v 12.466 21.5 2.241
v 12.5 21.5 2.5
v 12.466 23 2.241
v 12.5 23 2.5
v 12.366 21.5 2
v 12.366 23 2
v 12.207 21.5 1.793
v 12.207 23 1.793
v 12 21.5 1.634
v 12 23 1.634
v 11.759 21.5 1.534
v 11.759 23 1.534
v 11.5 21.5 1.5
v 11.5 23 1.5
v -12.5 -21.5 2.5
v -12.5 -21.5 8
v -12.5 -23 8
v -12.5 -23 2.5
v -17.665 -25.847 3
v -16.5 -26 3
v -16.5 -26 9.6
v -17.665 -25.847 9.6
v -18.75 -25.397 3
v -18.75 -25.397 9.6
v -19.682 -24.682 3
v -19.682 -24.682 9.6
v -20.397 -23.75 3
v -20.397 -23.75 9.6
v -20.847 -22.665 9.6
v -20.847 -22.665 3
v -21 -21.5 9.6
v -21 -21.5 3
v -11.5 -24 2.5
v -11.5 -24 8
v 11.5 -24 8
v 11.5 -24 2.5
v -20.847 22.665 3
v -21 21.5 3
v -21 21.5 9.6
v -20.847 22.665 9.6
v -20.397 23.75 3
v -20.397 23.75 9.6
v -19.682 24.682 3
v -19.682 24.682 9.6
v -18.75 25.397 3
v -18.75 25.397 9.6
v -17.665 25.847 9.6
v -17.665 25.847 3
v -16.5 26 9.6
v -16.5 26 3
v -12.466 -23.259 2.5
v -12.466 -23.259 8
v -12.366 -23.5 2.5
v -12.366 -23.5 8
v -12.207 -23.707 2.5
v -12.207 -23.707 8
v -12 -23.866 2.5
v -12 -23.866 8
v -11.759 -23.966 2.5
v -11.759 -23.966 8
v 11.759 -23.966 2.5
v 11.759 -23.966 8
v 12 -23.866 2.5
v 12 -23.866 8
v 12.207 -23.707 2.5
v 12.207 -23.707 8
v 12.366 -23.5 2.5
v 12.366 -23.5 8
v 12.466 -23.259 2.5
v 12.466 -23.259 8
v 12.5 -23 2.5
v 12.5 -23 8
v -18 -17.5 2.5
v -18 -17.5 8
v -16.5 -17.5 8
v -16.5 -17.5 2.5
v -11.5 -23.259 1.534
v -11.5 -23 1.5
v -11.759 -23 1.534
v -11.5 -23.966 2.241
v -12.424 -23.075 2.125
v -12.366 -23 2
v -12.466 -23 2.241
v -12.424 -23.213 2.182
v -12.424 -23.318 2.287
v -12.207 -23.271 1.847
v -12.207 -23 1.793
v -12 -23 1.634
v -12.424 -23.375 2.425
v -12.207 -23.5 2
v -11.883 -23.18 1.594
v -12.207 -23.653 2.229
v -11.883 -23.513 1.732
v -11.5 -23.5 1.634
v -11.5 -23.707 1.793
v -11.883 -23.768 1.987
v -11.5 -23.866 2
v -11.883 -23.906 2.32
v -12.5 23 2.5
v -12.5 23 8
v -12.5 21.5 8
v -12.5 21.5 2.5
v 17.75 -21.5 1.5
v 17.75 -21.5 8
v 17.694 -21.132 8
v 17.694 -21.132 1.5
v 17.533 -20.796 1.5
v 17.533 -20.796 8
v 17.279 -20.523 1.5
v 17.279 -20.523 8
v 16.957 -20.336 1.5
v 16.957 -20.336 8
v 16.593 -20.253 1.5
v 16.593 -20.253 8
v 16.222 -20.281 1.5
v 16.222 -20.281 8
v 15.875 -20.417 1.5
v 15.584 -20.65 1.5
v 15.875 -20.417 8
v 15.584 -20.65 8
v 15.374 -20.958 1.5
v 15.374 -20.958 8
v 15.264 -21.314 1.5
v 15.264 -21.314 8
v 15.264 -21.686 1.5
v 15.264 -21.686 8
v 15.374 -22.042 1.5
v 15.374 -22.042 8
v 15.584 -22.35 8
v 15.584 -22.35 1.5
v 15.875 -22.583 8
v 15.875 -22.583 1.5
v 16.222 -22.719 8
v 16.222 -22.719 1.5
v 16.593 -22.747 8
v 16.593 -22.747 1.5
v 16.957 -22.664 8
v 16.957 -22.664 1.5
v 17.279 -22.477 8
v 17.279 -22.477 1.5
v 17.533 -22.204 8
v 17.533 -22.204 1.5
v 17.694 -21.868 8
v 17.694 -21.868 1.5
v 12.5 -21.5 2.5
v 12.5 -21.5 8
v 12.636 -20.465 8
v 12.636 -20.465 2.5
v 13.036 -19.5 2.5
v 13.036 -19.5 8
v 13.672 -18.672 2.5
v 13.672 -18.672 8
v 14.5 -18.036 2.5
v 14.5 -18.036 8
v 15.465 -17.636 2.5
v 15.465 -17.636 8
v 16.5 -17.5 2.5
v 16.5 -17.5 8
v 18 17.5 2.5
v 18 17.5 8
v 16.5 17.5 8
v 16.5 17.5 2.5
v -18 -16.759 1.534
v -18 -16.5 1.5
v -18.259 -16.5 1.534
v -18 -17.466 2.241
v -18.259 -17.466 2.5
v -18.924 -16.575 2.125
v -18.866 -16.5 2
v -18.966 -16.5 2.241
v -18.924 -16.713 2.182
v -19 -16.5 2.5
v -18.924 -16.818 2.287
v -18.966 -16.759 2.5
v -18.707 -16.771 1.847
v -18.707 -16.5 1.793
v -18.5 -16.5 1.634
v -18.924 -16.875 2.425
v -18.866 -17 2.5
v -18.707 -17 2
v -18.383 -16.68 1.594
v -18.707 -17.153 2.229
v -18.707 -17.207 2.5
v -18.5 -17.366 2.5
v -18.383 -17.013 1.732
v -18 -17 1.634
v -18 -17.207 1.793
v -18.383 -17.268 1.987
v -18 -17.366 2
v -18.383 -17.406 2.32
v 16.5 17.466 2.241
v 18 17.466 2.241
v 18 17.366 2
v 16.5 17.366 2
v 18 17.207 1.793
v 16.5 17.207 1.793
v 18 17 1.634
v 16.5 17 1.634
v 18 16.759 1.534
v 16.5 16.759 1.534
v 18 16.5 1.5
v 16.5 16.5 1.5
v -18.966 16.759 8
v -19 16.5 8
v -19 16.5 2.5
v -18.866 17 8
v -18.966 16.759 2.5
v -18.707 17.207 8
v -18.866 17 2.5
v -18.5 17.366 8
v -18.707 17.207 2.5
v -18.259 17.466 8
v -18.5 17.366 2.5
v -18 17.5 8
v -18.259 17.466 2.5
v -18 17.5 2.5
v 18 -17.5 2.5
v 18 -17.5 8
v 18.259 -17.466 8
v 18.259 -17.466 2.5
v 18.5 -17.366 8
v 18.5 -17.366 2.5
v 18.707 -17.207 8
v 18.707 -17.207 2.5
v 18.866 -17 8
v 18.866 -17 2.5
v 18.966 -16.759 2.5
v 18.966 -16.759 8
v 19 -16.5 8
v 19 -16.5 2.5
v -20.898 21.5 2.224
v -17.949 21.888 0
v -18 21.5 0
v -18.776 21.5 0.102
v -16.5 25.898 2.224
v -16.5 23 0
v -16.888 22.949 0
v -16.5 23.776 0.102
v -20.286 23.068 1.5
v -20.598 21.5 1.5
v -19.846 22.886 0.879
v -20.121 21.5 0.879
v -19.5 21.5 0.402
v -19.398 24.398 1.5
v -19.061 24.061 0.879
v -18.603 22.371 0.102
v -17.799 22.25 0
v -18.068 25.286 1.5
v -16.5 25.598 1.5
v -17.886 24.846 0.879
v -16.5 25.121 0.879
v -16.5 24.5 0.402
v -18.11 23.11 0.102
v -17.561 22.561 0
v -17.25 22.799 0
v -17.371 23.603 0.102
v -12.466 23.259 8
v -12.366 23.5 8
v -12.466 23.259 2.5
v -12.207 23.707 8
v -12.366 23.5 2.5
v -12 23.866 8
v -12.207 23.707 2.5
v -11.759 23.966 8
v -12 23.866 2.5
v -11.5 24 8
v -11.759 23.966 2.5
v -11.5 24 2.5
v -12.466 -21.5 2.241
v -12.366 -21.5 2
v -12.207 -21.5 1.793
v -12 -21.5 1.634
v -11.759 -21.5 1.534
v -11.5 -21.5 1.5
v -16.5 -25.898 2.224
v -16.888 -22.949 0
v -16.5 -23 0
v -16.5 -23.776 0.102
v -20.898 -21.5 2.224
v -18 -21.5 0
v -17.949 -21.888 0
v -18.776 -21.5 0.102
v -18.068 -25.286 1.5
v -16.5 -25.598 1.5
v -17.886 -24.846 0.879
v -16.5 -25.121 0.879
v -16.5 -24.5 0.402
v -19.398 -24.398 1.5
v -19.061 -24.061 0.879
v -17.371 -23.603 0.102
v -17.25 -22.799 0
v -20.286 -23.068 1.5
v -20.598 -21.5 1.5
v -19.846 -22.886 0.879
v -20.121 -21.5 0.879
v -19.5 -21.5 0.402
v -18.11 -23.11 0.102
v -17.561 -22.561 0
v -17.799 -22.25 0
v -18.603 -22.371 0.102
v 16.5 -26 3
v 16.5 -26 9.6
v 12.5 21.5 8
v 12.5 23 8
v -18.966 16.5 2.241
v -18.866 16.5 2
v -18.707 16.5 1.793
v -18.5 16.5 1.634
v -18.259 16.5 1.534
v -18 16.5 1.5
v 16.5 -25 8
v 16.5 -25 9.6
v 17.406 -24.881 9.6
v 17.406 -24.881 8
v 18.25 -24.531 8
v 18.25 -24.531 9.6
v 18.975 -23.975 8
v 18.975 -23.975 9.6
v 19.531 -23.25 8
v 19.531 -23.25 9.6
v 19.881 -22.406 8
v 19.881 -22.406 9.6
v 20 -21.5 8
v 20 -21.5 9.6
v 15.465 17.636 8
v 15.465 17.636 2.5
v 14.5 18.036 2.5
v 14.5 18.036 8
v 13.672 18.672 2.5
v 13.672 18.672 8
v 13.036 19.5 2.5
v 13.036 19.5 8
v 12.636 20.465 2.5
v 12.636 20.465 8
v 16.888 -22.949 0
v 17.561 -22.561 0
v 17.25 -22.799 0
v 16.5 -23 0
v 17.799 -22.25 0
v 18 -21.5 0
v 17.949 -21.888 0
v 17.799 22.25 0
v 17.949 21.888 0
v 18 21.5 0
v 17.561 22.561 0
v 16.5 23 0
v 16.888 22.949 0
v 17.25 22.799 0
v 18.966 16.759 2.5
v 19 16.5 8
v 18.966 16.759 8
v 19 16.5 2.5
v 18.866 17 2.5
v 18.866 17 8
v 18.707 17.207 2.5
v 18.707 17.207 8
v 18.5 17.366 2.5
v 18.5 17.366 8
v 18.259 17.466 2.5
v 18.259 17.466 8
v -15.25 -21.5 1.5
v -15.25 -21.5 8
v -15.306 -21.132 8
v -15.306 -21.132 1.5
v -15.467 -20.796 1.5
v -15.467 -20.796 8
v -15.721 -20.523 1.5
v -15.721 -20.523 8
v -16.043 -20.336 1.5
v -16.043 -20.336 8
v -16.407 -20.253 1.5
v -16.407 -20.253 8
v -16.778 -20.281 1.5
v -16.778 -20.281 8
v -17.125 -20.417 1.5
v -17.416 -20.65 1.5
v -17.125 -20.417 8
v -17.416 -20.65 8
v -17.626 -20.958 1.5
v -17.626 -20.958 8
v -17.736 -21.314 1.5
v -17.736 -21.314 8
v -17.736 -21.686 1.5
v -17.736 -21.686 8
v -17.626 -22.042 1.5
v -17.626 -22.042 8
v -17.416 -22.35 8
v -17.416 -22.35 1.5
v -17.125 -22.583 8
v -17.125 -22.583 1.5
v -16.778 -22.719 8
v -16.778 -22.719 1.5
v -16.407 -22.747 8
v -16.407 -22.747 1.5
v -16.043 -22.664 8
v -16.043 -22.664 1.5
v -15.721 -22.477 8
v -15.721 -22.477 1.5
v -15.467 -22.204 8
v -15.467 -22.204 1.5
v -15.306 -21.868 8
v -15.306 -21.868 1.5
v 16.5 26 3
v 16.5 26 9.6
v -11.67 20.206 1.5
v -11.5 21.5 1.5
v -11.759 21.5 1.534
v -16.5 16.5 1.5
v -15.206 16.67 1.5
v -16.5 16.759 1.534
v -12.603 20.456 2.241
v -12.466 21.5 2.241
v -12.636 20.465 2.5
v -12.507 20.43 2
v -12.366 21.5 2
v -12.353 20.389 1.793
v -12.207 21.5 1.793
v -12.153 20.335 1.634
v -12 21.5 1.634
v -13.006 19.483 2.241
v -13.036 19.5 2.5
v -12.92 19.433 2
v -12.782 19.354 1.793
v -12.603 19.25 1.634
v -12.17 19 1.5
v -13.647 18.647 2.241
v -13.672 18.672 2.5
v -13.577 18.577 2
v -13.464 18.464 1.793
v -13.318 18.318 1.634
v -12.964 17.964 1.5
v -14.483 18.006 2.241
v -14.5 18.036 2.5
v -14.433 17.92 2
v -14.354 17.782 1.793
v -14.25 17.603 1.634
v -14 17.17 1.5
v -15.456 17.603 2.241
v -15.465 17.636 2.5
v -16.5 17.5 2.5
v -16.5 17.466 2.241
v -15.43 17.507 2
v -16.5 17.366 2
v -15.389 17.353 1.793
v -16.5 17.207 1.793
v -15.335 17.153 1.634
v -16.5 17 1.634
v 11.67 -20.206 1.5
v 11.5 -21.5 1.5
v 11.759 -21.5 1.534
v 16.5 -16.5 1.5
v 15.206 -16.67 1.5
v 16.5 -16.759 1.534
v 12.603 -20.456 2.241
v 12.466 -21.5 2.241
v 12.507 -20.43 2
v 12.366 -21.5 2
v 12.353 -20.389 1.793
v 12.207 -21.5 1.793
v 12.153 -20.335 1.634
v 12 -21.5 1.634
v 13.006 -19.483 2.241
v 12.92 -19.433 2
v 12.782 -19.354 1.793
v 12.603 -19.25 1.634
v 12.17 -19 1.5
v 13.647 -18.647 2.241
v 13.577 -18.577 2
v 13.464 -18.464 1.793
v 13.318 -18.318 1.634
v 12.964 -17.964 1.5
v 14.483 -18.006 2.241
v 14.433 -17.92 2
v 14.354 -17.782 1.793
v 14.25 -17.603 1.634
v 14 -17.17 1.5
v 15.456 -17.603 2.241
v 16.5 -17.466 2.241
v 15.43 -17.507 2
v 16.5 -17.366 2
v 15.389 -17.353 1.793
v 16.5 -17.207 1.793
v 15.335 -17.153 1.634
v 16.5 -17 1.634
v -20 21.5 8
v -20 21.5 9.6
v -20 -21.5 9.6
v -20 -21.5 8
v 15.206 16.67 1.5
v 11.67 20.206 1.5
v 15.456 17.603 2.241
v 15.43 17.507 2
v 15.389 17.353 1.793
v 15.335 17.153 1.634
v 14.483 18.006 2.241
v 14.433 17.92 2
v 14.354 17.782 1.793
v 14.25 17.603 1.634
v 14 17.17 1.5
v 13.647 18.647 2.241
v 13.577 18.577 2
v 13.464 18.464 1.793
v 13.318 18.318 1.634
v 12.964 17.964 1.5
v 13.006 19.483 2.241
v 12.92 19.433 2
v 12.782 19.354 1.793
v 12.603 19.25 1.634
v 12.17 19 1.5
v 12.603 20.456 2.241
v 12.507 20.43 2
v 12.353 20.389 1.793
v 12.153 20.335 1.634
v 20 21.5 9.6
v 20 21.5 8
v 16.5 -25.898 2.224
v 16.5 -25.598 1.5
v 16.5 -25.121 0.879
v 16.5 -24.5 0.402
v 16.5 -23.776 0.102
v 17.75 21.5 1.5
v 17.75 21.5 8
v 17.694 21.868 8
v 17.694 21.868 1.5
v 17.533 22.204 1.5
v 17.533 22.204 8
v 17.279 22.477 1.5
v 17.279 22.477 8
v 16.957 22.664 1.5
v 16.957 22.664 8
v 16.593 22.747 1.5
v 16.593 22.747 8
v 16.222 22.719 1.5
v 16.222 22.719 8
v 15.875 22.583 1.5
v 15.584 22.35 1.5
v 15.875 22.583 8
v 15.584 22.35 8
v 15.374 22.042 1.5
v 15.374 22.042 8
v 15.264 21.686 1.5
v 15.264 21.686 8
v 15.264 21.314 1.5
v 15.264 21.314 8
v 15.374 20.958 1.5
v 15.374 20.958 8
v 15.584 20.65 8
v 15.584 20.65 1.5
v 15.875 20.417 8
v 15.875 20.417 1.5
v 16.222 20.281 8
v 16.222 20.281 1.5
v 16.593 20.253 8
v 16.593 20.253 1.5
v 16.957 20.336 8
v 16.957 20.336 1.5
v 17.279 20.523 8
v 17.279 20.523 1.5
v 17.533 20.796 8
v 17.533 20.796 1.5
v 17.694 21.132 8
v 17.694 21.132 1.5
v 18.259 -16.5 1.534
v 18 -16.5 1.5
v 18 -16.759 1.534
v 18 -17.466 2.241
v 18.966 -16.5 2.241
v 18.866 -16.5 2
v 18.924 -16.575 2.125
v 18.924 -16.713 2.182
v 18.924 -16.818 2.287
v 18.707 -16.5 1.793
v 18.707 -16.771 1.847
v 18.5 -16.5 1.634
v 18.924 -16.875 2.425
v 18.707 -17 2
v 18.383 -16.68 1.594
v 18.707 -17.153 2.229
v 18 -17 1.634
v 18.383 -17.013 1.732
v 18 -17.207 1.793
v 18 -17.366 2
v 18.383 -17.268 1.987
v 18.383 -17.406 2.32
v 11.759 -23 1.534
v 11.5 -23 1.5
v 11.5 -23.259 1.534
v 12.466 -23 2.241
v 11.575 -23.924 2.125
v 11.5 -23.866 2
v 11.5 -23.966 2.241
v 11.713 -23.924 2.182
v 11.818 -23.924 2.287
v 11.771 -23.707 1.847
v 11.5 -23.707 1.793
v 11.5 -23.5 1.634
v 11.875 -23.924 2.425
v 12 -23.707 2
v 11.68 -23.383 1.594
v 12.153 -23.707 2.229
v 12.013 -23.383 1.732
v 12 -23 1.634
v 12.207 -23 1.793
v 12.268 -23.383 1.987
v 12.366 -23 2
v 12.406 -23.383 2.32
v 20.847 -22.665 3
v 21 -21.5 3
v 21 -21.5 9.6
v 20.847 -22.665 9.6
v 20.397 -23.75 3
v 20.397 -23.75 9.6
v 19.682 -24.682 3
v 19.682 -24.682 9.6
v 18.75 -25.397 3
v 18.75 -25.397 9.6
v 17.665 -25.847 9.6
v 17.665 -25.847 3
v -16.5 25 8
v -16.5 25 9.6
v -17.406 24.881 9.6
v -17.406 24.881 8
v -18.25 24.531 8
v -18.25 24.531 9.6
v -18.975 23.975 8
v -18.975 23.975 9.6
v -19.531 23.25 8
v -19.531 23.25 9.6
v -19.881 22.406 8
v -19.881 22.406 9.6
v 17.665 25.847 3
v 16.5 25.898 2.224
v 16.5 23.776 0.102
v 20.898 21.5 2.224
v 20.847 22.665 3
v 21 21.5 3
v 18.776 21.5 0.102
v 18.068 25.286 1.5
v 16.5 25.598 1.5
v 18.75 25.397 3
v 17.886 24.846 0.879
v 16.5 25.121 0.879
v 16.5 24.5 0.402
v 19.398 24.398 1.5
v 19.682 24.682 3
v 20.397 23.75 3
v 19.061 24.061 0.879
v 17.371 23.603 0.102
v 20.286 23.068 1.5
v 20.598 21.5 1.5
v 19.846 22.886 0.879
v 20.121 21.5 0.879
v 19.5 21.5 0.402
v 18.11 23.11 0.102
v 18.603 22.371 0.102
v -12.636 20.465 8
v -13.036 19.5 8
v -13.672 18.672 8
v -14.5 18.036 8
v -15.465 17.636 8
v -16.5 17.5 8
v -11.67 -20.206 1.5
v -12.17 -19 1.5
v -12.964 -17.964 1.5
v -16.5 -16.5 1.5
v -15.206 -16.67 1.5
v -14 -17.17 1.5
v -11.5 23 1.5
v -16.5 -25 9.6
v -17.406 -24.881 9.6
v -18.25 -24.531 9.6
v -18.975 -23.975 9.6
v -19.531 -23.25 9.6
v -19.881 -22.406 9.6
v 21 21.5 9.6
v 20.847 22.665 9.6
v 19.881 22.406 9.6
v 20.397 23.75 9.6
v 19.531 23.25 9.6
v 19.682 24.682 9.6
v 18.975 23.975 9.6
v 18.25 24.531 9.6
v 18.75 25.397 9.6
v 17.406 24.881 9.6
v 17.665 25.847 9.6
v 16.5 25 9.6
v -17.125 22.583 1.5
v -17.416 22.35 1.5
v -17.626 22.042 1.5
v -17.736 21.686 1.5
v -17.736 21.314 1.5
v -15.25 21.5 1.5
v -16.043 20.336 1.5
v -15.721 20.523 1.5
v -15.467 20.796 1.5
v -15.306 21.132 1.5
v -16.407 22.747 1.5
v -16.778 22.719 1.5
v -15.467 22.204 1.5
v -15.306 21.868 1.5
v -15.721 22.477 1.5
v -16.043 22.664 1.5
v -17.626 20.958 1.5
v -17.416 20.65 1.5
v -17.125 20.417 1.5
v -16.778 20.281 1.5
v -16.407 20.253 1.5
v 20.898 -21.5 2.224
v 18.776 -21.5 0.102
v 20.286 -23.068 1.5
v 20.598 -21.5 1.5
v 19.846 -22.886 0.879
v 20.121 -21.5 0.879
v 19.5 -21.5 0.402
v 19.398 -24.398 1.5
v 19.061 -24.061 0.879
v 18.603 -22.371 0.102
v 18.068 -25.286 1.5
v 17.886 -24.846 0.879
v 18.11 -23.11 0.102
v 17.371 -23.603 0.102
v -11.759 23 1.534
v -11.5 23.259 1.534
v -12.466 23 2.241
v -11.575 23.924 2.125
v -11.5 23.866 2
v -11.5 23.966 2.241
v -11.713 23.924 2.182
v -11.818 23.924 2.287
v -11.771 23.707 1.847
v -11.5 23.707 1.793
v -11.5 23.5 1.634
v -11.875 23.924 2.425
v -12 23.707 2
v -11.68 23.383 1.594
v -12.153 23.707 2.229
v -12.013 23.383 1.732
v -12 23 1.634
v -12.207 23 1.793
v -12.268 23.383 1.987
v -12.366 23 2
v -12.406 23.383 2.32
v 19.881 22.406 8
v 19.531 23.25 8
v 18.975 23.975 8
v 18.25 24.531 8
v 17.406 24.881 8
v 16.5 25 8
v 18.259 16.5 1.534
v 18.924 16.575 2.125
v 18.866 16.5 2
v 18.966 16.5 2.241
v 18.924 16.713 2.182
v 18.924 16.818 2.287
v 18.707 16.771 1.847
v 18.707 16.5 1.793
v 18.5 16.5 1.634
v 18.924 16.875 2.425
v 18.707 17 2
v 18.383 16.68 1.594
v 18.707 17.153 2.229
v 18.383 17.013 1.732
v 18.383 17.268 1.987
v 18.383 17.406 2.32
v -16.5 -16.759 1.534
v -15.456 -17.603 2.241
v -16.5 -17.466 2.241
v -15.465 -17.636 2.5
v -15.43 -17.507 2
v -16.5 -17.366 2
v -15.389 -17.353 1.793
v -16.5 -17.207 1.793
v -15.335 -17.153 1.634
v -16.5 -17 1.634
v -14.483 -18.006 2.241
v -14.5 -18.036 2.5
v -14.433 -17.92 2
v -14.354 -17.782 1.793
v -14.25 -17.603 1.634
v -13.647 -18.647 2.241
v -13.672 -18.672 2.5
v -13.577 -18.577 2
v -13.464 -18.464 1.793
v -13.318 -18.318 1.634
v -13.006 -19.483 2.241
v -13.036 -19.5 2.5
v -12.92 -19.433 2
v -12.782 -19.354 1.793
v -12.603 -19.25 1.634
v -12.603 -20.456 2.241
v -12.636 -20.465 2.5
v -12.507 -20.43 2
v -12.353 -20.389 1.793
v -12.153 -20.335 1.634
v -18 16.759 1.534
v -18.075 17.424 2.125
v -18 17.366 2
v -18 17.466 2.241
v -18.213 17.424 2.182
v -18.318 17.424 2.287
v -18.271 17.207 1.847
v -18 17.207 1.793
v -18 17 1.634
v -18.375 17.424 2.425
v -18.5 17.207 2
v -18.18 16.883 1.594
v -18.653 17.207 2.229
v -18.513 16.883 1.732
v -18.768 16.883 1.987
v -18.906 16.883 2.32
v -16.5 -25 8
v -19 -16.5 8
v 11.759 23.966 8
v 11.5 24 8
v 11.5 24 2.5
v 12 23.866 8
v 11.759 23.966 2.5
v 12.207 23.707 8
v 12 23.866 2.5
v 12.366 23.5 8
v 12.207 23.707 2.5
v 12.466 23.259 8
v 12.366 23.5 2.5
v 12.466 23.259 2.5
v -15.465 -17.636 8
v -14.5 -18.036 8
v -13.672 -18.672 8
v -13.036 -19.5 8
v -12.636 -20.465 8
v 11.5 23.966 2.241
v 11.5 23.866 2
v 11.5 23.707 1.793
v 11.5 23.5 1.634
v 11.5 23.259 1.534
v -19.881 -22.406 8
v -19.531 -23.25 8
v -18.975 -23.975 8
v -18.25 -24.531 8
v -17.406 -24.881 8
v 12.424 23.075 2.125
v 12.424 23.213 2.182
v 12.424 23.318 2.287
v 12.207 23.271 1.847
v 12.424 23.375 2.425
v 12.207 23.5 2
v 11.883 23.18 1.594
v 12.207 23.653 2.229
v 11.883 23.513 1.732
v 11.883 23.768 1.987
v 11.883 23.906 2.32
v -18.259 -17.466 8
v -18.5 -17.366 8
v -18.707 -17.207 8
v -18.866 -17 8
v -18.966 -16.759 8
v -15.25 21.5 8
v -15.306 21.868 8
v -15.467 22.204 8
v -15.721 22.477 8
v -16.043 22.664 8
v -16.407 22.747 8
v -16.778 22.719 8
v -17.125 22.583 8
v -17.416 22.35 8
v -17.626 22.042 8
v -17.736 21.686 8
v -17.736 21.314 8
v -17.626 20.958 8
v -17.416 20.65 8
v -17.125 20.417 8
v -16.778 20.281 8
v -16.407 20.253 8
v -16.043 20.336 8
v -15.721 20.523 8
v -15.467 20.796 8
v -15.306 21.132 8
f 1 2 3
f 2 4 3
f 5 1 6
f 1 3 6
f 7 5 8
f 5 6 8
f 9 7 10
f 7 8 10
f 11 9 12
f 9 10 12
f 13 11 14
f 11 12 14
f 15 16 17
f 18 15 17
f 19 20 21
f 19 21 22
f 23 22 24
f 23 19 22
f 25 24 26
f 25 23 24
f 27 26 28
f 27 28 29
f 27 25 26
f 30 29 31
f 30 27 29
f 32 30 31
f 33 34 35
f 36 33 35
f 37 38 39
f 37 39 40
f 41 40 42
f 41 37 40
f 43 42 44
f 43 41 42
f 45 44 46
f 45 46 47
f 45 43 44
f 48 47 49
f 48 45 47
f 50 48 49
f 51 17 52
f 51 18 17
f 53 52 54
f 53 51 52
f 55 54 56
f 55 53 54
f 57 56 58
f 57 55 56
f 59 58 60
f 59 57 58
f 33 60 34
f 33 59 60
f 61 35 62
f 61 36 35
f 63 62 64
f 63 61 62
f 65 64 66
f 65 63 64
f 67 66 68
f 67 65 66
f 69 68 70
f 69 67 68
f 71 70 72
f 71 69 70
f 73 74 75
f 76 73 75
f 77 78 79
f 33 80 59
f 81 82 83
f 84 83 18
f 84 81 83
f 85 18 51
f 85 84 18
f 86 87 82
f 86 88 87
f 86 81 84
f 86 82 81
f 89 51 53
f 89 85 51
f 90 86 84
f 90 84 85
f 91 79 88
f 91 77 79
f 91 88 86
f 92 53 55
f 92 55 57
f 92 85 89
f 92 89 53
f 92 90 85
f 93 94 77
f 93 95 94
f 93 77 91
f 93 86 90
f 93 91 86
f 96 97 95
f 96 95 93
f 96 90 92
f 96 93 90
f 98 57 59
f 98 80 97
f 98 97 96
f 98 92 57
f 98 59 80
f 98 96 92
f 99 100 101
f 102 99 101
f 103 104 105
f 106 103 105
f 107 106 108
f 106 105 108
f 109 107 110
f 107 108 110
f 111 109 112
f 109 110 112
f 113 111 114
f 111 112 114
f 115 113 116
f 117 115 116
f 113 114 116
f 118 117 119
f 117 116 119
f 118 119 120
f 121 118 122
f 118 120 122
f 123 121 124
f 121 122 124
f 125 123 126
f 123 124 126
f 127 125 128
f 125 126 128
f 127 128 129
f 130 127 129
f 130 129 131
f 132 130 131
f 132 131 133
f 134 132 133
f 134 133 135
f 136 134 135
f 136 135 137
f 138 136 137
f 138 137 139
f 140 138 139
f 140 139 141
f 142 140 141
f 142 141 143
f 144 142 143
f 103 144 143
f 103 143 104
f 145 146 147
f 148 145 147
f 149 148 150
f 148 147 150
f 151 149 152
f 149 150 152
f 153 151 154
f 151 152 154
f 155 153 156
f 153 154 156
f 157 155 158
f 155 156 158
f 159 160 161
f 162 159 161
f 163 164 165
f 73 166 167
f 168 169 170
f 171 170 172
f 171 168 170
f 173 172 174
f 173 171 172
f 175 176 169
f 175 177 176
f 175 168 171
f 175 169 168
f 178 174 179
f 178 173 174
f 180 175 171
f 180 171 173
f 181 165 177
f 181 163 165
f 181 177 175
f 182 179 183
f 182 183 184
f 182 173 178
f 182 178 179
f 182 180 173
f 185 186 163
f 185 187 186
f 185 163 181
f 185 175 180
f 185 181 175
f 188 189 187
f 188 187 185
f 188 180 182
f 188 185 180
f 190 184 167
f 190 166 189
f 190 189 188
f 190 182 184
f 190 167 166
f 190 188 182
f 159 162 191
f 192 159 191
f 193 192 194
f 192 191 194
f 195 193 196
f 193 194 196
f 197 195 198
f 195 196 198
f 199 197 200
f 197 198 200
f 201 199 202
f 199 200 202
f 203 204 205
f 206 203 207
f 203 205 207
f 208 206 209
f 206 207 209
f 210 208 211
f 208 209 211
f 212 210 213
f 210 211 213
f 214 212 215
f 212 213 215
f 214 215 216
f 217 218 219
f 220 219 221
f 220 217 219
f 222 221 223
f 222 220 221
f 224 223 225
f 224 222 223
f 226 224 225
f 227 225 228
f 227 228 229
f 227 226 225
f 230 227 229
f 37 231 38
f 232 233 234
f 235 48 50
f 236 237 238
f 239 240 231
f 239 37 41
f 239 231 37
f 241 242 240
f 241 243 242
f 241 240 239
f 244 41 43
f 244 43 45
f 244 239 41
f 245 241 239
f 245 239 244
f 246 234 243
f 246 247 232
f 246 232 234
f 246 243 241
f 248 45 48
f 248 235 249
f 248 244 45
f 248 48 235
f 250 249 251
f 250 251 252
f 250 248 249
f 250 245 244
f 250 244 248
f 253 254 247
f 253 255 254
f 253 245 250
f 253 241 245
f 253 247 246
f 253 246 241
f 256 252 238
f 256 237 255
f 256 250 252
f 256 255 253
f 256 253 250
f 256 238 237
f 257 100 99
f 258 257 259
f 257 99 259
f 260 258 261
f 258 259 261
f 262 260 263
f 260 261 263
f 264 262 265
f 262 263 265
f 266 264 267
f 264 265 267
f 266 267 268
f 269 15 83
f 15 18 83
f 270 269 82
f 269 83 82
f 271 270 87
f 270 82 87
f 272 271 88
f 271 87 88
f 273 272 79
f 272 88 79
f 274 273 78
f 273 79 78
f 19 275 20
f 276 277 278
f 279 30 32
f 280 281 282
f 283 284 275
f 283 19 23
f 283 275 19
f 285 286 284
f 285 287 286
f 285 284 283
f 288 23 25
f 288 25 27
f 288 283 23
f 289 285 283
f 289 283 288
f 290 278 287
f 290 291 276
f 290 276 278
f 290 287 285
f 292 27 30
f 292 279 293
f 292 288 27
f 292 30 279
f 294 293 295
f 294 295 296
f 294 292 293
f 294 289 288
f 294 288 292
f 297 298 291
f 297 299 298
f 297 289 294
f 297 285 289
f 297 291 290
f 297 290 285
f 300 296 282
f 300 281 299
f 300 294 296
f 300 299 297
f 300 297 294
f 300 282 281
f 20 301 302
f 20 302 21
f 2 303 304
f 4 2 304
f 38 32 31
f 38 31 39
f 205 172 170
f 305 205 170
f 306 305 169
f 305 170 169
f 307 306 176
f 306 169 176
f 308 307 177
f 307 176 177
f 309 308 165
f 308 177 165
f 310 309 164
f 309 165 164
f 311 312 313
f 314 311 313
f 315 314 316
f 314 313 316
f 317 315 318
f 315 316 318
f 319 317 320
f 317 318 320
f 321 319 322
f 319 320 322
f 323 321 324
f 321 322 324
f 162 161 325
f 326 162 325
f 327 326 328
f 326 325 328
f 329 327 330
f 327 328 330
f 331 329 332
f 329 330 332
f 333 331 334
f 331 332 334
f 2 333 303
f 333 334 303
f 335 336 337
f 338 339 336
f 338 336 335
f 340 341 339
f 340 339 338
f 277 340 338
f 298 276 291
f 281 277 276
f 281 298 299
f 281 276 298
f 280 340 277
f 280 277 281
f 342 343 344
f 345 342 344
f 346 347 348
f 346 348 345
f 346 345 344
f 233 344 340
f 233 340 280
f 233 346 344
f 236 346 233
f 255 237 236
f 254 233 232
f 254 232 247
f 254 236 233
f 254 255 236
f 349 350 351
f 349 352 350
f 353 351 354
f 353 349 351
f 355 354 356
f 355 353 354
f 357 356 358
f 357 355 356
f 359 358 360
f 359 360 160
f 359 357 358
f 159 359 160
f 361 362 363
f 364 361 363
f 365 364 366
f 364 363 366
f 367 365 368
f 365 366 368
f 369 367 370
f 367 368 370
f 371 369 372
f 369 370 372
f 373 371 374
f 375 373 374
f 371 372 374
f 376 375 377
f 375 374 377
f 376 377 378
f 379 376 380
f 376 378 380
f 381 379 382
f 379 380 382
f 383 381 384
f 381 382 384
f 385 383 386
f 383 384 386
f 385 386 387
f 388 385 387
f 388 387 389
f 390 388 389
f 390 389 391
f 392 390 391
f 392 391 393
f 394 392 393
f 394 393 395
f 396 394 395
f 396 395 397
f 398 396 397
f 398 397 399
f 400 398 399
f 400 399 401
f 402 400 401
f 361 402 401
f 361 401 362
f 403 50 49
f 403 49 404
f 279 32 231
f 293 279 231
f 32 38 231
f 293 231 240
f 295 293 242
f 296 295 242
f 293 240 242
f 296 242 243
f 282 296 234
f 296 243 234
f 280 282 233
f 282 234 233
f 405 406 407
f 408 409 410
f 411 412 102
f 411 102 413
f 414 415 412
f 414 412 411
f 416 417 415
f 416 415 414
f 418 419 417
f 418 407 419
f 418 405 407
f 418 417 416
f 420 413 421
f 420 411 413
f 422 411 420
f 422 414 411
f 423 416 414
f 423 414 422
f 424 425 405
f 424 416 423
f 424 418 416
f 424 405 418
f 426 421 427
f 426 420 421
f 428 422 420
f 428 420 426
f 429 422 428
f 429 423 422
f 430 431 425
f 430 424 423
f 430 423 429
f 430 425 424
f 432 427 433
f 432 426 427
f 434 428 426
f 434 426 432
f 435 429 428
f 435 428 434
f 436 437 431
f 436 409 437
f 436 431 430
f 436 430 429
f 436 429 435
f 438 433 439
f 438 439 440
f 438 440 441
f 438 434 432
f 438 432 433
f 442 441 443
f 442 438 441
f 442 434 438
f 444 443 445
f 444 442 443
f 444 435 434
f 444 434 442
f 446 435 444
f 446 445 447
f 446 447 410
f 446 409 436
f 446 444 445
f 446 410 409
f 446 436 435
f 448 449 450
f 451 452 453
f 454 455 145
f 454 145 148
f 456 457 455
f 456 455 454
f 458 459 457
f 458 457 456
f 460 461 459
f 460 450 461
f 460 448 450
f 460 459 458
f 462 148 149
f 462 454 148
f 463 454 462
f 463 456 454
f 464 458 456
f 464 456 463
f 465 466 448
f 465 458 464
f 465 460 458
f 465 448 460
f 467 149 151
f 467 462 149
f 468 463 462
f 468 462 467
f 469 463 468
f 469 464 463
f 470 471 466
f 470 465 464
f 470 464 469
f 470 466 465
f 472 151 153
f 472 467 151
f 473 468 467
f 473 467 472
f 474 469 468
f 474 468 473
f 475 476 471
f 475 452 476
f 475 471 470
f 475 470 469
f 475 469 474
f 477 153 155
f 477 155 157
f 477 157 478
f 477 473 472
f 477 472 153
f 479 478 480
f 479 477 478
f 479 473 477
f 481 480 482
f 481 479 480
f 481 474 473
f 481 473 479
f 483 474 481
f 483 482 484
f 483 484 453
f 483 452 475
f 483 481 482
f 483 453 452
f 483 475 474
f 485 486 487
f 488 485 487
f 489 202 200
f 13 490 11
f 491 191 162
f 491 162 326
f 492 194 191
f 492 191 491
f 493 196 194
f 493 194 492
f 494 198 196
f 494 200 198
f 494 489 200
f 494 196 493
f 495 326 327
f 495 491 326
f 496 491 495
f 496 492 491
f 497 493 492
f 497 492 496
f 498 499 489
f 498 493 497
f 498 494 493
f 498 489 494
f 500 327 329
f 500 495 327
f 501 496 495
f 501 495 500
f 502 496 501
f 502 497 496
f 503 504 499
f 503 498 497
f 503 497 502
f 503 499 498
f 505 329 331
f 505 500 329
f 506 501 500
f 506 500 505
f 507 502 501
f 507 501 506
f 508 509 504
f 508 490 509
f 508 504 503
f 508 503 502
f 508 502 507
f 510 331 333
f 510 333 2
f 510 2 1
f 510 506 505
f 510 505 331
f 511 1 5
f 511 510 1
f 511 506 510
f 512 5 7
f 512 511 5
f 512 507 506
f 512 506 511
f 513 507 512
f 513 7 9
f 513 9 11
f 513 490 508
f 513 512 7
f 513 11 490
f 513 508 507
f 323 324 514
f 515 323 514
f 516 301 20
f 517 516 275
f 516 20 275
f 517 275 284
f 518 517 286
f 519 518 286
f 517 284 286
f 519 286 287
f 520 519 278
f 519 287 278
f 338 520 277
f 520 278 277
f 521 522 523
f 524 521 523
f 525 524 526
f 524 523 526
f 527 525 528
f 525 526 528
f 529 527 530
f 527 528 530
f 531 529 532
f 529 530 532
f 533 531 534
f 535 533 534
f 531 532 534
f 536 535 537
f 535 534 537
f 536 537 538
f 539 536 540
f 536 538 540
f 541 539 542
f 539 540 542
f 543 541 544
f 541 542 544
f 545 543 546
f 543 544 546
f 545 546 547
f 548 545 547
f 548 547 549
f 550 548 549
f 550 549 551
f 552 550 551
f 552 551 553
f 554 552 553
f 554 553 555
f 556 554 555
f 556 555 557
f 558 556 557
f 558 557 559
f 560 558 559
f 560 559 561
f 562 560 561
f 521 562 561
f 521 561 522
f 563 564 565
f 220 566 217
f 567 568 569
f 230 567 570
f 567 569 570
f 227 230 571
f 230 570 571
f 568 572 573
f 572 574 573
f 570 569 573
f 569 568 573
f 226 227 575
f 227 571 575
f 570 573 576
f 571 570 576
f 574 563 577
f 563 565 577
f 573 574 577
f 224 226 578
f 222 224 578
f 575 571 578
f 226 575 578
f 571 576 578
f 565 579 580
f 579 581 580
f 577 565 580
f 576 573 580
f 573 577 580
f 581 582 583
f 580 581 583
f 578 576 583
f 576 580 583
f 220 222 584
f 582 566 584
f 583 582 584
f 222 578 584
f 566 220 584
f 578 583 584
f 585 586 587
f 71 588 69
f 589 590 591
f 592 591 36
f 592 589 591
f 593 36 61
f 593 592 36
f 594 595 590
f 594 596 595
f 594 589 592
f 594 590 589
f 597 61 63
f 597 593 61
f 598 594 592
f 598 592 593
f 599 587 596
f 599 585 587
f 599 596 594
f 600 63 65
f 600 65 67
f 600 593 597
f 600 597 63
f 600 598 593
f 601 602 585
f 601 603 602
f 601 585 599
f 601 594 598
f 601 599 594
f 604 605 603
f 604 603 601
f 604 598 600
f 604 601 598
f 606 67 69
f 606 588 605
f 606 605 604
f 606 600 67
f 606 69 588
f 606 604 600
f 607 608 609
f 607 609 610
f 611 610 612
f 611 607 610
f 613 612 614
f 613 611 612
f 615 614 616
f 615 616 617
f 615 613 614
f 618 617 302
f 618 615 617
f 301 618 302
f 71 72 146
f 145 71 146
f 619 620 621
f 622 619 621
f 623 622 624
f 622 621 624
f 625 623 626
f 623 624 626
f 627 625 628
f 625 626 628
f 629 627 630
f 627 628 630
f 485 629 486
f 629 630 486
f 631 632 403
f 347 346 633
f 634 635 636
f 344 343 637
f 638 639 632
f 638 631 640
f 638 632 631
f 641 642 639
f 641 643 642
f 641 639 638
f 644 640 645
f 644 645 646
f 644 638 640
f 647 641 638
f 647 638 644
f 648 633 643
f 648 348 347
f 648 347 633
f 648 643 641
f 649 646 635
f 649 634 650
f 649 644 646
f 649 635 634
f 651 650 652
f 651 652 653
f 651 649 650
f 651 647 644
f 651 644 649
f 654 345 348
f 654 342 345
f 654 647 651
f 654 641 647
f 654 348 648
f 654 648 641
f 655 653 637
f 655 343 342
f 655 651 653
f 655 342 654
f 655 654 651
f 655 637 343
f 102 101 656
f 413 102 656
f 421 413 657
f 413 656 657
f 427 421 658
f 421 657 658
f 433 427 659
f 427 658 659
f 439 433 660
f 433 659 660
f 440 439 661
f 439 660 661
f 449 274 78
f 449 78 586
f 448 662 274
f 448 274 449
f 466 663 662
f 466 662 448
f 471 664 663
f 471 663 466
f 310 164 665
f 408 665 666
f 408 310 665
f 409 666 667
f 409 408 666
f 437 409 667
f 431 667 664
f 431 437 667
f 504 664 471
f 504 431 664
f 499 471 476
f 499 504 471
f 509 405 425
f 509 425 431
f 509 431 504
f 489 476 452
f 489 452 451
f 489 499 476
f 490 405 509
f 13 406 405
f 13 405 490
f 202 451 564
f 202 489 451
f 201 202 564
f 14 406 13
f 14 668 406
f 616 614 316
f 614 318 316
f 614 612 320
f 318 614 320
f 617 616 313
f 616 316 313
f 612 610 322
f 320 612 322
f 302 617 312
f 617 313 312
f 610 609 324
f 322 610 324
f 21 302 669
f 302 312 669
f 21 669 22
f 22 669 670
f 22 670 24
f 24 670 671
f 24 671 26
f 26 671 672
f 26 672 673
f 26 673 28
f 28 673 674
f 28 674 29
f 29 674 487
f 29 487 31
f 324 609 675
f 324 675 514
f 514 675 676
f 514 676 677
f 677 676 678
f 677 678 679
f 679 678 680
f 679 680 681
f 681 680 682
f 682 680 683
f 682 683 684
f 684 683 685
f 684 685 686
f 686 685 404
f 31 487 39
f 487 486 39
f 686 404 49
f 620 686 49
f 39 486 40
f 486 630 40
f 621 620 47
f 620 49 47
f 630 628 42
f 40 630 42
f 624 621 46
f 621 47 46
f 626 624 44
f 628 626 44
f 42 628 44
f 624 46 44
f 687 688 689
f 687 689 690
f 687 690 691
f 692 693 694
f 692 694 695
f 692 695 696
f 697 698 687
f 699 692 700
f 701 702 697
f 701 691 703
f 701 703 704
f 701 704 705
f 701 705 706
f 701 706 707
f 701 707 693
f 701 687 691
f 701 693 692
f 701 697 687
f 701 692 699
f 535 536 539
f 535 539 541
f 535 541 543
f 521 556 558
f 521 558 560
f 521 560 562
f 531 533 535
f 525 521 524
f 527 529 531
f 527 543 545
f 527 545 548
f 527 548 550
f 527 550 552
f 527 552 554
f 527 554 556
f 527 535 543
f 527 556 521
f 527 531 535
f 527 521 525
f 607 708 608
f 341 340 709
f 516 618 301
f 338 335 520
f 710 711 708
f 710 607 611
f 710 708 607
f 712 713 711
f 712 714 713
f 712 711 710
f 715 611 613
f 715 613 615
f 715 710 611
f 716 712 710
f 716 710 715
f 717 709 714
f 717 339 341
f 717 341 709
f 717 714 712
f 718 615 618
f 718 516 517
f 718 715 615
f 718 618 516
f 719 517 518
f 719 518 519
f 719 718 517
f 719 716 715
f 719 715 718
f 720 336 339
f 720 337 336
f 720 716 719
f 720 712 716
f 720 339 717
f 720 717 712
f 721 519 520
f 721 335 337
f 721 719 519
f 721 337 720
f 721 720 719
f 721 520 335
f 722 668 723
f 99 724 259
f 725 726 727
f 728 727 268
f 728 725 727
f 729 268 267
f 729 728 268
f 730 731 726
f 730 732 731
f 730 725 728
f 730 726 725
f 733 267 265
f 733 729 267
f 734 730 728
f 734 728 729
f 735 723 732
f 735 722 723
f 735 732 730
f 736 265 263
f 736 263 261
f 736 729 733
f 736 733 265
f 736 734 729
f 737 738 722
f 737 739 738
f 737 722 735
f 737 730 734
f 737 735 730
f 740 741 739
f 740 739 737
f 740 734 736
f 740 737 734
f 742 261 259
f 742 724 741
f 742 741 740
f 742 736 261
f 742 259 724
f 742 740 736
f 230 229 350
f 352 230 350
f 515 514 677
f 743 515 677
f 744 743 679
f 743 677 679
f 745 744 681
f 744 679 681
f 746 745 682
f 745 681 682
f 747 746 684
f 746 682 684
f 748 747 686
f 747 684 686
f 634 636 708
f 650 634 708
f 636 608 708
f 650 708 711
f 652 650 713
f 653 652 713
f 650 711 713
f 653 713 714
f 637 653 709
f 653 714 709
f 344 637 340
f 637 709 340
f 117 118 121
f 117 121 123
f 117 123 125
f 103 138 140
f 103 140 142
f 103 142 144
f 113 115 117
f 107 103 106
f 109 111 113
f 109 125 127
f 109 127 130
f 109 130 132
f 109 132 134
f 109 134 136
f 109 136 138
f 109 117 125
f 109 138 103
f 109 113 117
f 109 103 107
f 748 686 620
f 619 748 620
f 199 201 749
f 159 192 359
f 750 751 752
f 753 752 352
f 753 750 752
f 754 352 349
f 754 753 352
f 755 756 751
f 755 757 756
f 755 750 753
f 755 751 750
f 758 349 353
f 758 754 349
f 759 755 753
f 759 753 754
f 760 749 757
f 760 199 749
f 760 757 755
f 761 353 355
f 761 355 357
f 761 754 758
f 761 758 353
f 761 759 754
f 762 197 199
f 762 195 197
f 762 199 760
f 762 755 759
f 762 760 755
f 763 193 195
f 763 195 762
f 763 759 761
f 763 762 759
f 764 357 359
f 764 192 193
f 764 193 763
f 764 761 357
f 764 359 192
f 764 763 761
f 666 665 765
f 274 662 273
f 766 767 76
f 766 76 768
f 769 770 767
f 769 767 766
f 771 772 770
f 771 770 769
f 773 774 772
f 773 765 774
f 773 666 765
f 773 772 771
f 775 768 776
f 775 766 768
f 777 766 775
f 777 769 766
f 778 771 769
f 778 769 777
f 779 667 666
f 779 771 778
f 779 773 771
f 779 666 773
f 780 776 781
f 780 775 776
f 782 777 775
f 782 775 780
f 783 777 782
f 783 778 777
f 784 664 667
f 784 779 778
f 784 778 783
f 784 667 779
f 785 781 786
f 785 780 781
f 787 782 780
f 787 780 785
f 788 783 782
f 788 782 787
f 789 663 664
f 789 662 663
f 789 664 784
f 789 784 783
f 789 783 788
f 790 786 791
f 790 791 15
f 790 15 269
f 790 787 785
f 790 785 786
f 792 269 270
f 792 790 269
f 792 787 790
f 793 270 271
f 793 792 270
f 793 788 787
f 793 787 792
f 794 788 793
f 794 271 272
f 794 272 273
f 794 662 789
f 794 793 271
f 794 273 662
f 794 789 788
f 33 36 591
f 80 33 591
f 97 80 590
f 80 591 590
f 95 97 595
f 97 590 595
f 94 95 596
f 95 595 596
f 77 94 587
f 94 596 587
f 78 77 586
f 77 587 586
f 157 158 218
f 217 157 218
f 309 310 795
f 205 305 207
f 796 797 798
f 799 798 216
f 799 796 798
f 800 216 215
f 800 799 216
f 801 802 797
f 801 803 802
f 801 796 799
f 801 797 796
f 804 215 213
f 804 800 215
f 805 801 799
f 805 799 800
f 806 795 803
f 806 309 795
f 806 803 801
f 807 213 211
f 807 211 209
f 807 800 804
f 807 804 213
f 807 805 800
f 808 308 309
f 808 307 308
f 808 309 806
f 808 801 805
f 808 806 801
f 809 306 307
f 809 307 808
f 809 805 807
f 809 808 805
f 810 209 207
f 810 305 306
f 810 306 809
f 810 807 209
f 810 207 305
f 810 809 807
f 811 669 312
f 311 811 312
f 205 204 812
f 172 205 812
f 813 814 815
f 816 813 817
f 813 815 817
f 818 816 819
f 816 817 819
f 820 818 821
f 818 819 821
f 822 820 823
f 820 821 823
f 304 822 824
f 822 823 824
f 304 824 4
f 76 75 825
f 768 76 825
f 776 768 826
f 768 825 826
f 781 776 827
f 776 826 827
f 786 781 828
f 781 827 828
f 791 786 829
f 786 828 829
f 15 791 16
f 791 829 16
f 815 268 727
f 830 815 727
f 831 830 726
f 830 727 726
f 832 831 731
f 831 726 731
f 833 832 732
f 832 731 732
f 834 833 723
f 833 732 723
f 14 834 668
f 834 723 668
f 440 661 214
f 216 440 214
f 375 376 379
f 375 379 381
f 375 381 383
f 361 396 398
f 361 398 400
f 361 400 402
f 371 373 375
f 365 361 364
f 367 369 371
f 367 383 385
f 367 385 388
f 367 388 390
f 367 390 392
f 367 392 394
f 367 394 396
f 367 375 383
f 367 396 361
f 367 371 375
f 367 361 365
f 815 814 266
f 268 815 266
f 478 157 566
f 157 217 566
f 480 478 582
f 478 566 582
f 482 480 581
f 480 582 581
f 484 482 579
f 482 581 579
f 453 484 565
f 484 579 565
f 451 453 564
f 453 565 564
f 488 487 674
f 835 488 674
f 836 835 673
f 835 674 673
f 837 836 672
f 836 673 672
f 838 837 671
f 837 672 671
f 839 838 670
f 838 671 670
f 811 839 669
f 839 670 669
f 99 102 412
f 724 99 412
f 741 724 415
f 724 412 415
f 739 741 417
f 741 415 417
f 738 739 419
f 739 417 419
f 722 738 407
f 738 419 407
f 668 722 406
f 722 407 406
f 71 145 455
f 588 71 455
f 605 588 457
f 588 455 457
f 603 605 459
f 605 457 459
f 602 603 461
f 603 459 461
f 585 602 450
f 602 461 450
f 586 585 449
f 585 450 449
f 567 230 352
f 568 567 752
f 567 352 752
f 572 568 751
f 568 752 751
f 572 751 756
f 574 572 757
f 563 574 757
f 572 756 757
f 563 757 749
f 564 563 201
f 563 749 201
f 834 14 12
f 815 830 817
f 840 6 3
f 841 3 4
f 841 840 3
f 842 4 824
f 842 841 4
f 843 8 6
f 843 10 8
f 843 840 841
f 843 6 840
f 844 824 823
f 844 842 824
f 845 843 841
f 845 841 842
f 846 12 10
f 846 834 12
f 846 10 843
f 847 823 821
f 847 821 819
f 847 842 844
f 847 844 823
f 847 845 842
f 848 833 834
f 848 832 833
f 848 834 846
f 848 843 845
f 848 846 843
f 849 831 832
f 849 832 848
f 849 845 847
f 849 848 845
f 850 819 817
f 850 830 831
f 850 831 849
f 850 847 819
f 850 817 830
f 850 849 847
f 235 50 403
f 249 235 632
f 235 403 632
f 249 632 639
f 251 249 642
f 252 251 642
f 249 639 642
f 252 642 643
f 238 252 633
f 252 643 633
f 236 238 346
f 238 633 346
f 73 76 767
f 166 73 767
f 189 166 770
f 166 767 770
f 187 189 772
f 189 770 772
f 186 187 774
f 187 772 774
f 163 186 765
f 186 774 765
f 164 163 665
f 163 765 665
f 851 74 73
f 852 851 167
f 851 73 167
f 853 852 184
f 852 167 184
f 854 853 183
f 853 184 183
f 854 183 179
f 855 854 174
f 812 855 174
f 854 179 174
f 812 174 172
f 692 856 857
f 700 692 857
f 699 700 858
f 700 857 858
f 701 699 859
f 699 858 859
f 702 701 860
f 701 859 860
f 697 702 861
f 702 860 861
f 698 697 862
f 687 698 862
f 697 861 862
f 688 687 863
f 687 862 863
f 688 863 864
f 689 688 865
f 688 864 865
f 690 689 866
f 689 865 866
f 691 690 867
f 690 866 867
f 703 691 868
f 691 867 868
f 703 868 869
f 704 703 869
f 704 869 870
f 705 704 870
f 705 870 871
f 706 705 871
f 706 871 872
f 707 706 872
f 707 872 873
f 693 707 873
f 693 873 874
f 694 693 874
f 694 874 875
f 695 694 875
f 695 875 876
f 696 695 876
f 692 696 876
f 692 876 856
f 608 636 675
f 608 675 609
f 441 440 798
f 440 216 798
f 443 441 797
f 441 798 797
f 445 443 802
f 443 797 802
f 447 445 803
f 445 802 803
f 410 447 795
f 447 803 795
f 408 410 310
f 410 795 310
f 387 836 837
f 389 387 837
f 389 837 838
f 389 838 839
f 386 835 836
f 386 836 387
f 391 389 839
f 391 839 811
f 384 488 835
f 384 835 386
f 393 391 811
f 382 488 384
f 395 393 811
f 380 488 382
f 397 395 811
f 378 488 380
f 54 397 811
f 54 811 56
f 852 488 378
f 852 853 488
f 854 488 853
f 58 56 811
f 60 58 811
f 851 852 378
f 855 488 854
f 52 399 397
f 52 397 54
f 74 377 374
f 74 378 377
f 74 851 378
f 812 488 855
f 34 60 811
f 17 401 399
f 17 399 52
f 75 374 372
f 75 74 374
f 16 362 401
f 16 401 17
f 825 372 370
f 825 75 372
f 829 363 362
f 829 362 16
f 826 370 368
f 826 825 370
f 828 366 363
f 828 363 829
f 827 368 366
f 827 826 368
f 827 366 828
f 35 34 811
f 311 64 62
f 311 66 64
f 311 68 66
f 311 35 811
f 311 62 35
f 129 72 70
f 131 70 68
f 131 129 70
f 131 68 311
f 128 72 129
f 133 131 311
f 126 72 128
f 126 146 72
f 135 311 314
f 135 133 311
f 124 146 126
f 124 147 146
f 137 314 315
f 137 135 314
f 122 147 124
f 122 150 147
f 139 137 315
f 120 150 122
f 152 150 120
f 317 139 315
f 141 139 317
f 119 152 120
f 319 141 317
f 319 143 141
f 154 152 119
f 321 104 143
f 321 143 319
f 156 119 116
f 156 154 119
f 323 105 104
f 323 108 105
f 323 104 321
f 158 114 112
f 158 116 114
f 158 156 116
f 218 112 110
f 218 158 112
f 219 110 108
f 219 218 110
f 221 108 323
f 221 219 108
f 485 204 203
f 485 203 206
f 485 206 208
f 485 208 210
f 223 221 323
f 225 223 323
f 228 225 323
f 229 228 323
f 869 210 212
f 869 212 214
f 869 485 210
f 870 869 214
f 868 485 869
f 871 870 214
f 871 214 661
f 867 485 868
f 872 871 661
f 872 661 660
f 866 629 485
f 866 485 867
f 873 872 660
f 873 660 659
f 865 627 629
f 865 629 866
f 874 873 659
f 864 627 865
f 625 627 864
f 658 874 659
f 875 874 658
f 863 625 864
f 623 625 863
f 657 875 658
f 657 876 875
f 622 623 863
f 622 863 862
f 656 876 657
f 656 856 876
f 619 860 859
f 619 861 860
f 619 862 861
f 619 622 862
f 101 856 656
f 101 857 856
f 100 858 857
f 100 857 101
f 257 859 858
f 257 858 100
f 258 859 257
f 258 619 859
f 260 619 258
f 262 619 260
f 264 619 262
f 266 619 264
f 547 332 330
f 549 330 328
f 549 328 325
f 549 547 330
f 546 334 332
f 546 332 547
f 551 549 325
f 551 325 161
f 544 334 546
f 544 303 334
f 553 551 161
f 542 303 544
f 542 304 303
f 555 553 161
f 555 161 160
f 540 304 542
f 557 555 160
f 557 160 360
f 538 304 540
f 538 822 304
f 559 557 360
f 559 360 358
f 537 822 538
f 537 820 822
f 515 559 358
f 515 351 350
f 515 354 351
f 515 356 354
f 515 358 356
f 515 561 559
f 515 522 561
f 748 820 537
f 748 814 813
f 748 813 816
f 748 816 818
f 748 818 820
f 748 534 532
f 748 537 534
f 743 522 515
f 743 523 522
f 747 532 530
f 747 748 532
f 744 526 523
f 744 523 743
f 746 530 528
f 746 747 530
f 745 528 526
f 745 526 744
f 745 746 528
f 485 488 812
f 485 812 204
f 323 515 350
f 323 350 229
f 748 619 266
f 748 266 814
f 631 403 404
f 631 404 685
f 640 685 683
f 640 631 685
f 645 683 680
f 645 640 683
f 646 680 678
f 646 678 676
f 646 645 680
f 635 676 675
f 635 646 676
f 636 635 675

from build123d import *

# Parameters (mm, degrees)
BOSS_EXTRUDE1_DEPTH = 9.6
CUT_EXTRUDE1_START  = 9.6
CUT_EXTRUDE1_DEPTH  = 1.6
CUT_EXTRUDE2_START  = 9.6
CUT_EXTRUDE2_DEPTH  = 8.1
CUT_EXTRUDE3_START  = 9.6
SKETCH5_R           = 1.25
CUT_EXTRUDE3_DEPTH  = 8.1
FILLET2_R           = 1
FILLET3_R           = 3


with BuildPart() as part:
    # Sketch2 → Boss-Extrude1 (new body)
    with BuildSketch(Plane.XY):
        with BuildLine():
            Line((21, 21.5), (21, -21.5))
            ThreePointArc((21, -21.5), (19.681980515, -24.681980515), (16.5, -26))
            Line((16.5, -26), (-16.5, -26))
            ThreePointArc((-16.5, -26), (-19.681980515, -24.681980515), (-21, -21.5))
            Line((-21, -21.5), (-21, 21.5))
            ThreePointArc((-21, 21.5), (-19.681980515, 24.681980515), (-16.5, 26))
            Line((-16.5, 26), (16.5, 26))
            ThreePointArc((16.5, 26), (19.681980515, 24.681980515), (21, 21.5))
        make_face()
    extrude(amount=BOSS_EXTRUDE1_DEPTH)

    # Sketch3 → Cut-Extrude1 (cut)
    with BuildSketch(Plane.XY.offset(CUT_EXTRUDE1_START)):
        with BuildLine():
            Line((-20, 21.5), (-20, -21.5))
            ThreePointArc((-20, -21.5), (-18.974873734, -23.974873734), (-16.5, -25))
            Line((-16.5, -25), (16.5, -25))
            ThreePointArc((16.5, -25), (18.974873734, -23.974873734), (20, -21.5))
            Line((20, -21.5), (20, 21.5))
            ThreePointArc((20, 21.5), (18.974873734, 23.974873734), (16.5, 25))
            Line((16.5, 25), (-16.5, 25))
            ThreePointArc((-16.5, 25), (-18.974873734, 23.974873734), (-20, 21.5))
        make_face()
    extrude(amount=-CUT_EXTRUDE1_DEPTH, mode=Mode.SUBTRACT)

    # Sketch4 → Cut-Extrude2 (cut)
    with BuildSketch(Plane.XY.offset(CUT_EXTRUDE2_START)):
        with BuildLine():
            Line((-12.5, -21.5), (-12.5, -24))
            Line((-12.5, -24), (12.5, -24))
            Line((12.5, -24), (12.5, -21.5))
            ThreePointArc((12.5, -21.5), (13.671572875, -18.671572875), (16.5, -17.5))
            Line((16.5, -17.5), (19, -17.5))
            Line((19, -17.5), (19, 17.5))
            Line((19, 17.5), (16.5, 17.5))
            ThreePointArc((16.5, 17.5), (13.671572875, 18.671572875), (12.5, 21.5))
            Line((12.5, 21.5), (12.5, 24))
            Line((12.5, 24), (-12.5, 24))
            Line((-12.5, 24), (-12.5, 21.5))
            ThreePointArc((-12.5, 21.5), (-13.671572875, 18.671572875), (-16.5, 17.5))
            Line((-16.5, 17.5), (-19, 17.5))
            Line((-19, 17.5), (-19, -17.5))
            Line((-19, -17.5), (-16.5, -17.5))
            ThreePointArc((-16.5, -17.5), (-13.671572875, -18.671572875), (-12.5, -21.5))
        make_face()
    extrude(amount=-CUT_EXTRUDE2_DEPTH, mode=Mode.SUBTRACT)

    # Sketch5 → Cut-Extrude3 (cut)
    with BuildSketch(Plane.XY.offset(CUT_EXTRUDE3_START)):
        with Locations((-16.5, 21.5)):
            Circle(SKETCH5_R)
        with Locations((16.5, 21.5)):
            Circle(SKETCH5_R)
        with Locations((-16.5, -21.5)):
            Circle(SKETCH5_R)
        with Locations((16.5, -21.5)):
            Circle(SKETCH5_R)
    extrude(amount=-CUT_EXTRUDE3_DEPTH, mode=Mode.SUBTRACT)

    # Fillet2
    fillet2_edges = [part.edges().sort_by_distance(p)[0] for p in [
        (13.671572875, -18.671572875, 1.5),
        (12.5, -22.75, 1.5),
        (0, -24, 1.5),
        (12.5, -24, 4.75),
        (-12.5, -22.75, 1.5),
        (-12.5, -24, 4.75),
        (-13.671572875, -18.671572875, 1.5),
        (-17.75, -17.5, 1.5),
        (-19, 0, 1.5),
        (-19, -17.5, 4.75),
        (-17.75, 17.5, 1.5),
        (-19, 17.5, 4.75),
        (-13.671572875, 18.671572875, 1.5),
        (-12.5, 22.75, 1.5),
        (0, 24, 1.5),
        (-12.5, 24, 4.75),
        (12.5, 22.75, 1.5),
        (12.5, 24, 4.75),
        (13.671572875, 18.671572875, 1.5),
        (17.75, 17.5, 1.5),
        (19, 0, 1.5),
        (19, 17.5, 4.75),
        (17.75, -17.5, 1.5),
        (19, -17.5, 4.75),
    ]]
    fillet(fillet2_edges, radius=FILLET2_R)

    # Fillet3
    fillet3_edges = [part.edges().sort_by_distance(p)[0] for p in [
        (-21, 0, 0),
        (-19.681980515, 24.681980515, 0),
        (0, 26, 0),
        (19.681980515, 24.681980515, 0),
        (21, 0, 0),
        (19.681980515, -24.681980515, 0),
        (0, -26, 0),
        (-19.681980515, -24.681980515, 0),
    ]]
    fillet(fillet3_edges, radius=FILLET3_R)


solid = part.part
